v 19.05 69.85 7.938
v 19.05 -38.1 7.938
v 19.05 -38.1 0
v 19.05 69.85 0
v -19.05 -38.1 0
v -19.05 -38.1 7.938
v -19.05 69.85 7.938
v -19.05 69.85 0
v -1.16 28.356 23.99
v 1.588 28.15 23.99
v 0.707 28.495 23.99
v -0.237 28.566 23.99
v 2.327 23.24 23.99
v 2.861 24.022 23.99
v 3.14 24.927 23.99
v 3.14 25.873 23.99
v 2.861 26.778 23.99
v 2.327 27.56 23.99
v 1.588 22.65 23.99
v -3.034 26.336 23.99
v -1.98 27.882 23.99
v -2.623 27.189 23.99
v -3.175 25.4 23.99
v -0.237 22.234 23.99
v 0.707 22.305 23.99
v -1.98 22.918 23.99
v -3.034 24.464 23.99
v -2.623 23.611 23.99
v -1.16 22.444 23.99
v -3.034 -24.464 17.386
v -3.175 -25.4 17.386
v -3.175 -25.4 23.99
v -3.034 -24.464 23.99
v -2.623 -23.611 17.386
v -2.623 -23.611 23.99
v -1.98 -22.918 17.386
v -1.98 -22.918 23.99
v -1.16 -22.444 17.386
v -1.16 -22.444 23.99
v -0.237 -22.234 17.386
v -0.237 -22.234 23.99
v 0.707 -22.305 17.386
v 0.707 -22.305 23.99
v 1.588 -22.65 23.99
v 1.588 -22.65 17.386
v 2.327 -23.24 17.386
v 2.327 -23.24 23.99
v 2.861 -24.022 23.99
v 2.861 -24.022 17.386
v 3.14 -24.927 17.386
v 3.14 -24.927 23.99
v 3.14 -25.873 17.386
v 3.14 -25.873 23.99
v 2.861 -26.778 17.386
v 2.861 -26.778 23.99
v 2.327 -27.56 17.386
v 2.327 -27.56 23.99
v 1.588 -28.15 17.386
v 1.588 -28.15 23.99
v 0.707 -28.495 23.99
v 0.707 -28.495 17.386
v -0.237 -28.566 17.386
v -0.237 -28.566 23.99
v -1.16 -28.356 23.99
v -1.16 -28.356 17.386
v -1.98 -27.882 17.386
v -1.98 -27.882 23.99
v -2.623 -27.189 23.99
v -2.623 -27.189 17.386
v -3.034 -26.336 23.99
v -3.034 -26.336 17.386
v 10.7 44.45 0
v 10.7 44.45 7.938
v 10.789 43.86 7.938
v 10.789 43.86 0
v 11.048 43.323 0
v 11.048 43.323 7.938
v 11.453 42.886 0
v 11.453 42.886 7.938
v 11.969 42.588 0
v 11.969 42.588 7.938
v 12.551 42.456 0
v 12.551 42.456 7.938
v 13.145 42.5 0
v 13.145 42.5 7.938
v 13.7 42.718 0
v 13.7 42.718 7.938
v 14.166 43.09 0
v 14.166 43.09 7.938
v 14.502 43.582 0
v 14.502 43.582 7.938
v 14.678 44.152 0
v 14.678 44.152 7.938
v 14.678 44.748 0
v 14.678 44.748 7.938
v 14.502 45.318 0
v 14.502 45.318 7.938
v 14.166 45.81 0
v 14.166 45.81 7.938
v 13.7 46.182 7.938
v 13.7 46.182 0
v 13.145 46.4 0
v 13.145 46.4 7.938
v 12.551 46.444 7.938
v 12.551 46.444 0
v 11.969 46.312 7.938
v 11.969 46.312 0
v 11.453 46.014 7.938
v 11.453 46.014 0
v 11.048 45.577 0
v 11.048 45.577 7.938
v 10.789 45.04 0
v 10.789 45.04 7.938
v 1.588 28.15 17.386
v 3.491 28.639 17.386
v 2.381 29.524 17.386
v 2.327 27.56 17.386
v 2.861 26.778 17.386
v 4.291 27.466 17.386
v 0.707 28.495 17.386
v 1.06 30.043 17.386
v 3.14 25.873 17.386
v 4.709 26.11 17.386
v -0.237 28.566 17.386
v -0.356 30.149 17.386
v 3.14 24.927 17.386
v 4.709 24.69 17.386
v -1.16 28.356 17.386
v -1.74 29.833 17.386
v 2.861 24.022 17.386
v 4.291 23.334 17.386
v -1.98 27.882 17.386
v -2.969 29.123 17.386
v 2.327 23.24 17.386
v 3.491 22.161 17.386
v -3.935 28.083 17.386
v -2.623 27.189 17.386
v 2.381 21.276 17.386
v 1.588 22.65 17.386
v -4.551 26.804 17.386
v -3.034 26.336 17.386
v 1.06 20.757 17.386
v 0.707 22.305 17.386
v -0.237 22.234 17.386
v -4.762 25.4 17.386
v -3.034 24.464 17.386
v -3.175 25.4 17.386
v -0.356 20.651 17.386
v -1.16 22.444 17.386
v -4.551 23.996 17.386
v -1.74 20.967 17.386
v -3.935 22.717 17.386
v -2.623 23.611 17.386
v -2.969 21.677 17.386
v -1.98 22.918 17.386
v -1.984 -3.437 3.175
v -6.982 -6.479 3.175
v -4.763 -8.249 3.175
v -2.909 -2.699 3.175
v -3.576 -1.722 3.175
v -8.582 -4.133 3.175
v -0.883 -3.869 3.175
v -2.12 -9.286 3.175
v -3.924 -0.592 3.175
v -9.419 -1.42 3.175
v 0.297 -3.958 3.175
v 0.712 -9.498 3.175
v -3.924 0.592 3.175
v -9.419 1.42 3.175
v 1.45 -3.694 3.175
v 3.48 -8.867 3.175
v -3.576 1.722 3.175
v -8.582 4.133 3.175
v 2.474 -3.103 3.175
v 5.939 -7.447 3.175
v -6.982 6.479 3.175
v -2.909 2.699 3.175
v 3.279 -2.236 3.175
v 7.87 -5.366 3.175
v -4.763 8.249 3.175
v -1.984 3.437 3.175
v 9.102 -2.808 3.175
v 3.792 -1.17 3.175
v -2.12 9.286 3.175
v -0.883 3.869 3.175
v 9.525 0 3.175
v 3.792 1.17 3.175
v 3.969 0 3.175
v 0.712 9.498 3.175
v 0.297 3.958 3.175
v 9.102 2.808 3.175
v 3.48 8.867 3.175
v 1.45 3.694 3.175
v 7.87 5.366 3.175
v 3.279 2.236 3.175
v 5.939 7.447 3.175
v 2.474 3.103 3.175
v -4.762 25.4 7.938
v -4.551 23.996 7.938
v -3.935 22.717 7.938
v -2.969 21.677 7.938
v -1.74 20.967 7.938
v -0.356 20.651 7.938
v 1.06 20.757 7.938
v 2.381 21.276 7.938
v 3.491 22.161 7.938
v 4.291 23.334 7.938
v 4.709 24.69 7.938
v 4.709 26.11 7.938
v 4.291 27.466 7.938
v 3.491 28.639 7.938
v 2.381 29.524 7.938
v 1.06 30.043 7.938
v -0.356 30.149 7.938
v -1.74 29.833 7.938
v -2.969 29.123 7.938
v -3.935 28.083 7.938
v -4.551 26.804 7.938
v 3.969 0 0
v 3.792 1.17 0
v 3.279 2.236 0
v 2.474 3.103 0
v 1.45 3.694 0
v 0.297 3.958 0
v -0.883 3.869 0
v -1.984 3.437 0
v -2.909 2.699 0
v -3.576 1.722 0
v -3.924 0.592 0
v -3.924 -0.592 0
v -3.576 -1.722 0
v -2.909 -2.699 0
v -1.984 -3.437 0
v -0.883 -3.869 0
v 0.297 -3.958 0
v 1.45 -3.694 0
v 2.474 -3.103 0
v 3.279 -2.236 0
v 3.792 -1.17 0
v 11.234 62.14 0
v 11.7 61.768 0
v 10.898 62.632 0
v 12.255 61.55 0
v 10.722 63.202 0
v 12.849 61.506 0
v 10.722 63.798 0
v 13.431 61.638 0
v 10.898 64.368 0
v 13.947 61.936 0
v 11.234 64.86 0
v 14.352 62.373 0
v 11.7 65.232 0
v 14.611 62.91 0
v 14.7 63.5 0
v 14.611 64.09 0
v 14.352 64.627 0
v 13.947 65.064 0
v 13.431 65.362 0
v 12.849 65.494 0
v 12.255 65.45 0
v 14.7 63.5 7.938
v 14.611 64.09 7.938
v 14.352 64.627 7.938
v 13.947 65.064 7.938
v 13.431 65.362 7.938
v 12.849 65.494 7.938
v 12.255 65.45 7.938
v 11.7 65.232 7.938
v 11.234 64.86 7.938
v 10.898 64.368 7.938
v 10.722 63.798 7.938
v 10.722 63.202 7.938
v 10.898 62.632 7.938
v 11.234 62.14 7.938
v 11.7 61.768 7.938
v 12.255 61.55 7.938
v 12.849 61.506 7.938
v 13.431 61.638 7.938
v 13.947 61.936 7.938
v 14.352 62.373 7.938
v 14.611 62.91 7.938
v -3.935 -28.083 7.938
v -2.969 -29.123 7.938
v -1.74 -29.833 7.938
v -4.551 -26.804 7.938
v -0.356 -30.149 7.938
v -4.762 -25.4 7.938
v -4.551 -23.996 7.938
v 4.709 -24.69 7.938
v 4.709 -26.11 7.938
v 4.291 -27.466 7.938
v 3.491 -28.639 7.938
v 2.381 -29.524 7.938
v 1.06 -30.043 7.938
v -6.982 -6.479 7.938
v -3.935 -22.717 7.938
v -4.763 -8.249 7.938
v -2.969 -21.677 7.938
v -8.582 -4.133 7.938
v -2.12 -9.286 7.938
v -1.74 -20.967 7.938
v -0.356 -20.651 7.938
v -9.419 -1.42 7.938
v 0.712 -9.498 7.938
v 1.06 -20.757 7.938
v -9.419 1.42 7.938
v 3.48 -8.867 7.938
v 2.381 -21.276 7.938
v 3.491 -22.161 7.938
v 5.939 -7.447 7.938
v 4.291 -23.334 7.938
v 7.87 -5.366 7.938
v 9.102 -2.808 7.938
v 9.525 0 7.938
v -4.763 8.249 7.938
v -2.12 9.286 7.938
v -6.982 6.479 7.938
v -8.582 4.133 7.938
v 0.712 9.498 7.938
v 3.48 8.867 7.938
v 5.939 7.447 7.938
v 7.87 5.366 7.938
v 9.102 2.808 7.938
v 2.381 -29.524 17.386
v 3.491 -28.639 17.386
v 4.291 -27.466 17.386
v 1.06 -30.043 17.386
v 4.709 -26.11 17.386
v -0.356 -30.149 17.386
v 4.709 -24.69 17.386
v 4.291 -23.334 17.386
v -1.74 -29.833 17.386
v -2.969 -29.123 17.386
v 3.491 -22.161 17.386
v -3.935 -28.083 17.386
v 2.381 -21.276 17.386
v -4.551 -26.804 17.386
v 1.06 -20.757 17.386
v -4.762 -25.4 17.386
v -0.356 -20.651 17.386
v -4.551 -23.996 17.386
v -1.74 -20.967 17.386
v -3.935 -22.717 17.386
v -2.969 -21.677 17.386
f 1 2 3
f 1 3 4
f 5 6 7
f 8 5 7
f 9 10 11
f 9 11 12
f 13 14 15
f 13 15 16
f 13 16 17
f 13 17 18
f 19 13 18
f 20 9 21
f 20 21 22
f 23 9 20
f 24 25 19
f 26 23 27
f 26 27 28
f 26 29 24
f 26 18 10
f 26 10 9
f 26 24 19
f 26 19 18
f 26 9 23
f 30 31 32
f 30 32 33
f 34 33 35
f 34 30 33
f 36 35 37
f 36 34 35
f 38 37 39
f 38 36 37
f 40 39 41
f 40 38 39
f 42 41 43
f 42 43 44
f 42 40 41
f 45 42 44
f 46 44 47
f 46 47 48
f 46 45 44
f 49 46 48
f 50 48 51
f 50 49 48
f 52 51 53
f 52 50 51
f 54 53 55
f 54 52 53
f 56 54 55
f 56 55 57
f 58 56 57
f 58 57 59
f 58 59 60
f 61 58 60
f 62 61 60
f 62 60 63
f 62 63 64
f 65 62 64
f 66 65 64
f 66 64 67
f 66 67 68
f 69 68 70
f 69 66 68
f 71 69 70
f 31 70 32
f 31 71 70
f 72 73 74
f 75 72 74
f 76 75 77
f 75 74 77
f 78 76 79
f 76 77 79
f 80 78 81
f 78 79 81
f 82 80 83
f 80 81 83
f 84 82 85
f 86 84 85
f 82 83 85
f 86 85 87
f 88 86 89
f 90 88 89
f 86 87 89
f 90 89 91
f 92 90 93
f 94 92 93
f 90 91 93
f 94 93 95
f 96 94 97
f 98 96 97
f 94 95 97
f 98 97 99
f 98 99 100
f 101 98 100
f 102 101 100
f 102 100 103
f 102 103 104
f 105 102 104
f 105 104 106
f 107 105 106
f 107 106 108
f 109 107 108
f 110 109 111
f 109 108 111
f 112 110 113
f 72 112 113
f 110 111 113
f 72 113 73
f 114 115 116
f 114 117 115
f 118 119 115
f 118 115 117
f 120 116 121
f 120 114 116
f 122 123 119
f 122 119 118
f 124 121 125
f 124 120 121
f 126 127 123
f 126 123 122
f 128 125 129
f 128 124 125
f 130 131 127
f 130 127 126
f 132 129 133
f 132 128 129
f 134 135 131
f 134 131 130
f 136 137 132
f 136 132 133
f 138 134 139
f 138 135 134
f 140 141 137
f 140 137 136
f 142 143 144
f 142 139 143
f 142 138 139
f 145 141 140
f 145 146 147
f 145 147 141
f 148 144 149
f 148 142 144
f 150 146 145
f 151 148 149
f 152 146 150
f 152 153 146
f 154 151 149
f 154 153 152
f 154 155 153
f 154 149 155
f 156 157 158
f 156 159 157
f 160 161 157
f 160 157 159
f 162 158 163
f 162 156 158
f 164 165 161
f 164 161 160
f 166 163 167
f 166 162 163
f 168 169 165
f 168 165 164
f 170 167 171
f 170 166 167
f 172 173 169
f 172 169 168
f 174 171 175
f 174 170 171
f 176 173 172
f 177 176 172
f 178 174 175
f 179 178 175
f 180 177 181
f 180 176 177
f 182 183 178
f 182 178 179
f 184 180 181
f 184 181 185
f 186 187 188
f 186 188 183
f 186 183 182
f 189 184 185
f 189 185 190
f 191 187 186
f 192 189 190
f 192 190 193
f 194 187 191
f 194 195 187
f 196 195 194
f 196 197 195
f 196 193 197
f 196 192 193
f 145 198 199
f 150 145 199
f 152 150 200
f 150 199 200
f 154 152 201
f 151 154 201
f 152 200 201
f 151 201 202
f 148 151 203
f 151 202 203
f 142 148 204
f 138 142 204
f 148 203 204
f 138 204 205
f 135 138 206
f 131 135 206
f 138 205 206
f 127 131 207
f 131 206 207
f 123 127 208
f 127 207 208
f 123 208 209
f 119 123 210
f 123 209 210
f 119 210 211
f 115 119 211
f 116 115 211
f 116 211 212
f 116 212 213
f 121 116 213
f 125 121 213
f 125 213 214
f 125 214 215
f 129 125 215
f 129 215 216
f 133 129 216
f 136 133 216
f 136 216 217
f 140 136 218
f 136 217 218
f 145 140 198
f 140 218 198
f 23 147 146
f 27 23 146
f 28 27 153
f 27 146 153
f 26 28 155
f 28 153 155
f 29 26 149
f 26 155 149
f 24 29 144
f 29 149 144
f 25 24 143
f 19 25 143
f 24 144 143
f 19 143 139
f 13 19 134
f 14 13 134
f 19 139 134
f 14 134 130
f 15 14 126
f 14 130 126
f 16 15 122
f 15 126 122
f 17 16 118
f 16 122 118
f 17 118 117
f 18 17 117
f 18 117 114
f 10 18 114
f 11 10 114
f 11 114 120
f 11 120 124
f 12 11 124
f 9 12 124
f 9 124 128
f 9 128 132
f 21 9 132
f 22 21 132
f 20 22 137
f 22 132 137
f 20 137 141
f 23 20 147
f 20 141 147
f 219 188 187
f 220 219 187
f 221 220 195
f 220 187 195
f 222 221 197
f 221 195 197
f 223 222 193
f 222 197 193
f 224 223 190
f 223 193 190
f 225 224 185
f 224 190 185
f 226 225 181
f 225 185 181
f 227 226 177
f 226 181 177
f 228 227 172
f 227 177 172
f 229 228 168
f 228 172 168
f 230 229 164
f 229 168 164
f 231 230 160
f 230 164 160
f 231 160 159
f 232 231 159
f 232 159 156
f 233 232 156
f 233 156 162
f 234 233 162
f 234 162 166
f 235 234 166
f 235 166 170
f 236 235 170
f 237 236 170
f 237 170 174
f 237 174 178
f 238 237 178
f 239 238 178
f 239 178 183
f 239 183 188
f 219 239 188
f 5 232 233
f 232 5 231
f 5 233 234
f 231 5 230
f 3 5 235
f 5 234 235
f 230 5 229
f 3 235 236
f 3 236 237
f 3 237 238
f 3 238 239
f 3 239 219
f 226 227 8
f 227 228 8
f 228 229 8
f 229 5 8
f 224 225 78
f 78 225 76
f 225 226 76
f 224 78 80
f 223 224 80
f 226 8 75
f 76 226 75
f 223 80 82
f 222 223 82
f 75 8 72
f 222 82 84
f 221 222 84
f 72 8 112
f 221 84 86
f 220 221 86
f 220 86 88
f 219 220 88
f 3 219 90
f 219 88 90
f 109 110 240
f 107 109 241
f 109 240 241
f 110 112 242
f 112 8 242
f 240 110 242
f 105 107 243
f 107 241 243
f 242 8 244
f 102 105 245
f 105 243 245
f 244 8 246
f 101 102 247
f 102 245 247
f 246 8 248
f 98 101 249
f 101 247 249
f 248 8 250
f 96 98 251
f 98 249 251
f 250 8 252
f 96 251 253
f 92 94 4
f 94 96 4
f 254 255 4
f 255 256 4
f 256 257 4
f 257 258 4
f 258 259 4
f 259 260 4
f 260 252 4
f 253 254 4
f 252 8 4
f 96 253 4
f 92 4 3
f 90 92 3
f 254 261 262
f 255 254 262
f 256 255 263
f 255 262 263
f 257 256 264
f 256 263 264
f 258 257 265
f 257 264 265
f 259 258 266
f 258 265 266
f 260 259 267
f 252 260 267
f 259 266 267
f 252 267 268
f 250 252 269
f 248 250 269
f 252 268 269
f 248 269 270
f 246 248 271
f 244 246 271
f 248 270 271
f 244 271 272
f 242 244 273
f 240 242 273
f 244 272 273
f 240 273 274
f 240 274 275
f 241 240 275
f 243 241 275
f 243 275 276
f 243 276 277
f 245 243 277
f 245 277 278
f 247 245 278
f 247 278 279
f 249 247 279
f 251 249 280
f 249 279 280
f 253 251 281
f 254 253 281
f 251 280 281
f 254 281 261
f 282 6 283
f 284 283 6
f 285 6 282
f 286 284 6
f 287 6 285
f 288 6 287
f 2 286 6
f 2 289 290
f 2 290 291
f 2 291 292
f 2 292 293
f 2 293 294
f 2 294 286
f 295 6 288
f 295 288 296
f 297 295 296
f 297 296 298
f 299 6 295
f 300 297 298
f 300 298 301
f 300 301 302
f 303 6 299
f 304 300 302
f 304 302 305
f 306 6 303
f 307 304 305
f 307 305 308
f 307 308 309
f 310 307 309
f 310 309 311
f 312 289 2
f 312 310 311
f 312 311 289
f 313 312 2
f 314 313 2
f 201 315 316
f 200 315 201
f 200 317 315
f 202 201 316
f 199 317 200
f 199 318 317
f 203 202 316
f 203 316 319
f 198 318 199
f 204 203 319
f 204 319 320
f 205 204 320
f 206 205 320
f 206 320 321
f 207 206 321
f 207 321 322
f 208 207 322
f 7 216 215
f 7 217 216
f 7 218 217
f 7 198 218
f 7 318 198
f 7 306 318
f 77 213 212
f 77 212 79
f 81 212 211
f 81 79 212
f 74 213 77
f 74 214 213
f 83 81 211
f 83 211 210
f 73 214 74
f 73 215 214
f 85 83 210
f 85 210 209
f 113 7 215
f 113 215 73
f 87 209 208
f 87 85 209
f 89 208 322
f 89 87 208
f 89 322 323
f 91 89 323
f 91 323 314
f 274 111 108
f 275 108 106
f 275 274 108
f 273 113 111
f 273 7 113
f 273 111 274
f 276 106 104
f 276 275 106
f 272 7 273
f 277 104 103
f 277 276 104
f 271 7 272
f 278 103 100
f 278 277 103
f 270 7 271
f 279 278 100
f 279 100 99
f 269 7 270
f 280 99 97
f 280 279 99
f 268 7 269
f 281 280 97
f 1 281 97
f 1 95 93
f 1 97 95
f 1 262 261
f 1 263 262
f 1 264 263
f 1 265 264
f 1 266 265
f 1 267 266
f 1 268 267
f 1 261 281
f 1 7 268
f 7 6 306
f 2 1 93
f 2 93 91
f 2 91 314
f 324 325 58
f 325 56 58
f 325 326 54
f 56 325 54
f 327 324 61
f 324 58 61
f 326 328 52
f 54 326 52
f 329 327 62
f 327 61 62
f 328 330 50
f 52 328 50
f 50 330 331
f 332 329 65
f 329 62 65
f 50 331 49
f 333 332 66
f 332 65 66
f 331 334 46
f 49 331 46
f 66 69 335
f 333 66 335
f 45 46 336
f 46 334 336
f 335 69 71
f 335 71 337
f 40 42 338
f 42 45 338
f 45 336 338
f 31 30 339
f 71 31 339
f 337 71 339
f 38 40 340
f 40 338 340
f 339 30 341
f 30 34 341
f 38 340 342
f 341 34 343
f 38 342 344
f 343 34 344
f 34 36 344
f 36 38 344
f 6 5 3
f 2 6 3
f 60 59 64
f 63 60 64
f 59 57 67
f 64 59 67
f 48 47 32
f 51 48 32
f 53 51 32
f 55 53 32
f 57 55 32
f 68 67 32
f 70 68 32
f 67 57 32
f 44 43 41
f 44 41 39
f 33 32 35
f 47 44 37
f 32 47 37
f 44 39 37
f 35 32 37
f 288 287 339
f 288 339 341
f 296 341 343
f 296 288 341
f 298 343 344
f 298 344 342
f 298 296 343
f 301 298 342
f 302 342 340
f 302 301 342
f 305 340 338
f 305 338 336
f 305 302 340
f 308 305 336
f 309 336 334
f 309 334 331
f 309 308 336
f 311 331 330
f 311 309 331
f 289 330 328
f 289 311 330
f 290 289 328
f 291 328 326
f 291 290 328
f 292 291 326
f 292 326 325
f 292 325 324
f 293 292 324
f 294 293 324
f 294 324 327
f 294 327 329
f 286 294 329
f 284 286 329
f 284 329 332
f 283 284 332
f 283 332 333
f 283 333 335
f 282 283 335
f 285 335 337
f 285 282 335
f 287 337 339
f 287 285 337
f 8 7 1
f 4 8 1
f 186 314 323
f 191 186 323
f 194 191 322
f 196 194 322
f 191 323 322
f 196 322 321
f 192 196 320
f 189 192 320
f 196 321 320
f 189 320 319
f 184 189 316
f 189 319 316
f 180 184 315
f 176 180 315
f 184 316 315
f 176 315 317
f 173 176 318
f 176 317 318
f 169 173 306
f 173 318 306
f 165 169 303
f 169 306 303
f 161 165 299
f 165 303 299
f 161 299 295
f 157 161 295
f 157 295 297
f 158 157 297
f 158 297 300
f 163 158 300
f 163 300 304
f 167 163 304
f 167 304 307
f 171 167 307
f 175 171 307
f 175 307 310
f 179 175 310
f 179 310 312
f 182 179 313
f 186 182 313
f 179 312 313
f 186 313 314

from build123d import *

# Parameters (mm, degrees)
SKETCH1_W           = 38.1
SKETCH1_H           = 76.2
BOSS_EXTRUDE1_DEPTH = 7.9375
SKETCH2_R           = 3.96875
CUT_EXTRUDE1_DEPTH  = 44.330317403
SKETCH4_R           = 9.525
CUT_EXTRUDE2_DEPTH  = 4.7625
SKETCH5_R           = 4.7625
BOSS_EXTRUDE2_DEPTH = 9.4488
SKETCH6_R           = 3.175
BOSS_EXTRUDE3_DEPTH = 6.604
SKETCH7_W           = 38.1
SKETCH7_H           = 31.75
SKETCH7_R           = 2
BOSS_EXTRUDE4_DEPTH = 7.9375


with BuildPart() as part:
    # Sketch1 → Boss-Extrude1 (new body)
    with BuildSketch(Plane.XY):
        Rectangle(SKETCH1_W, SKETCH1_H)
    extrude(amount=BOSS_EXTRUDE1_DEPTH)

    # Sketch2 → Cut-Extrude1 (cut, through all)
    with BuildSketch(Plane.XY.offset(7.9375)):
        Circle(SKETCH2_R)
    extrude(amount=-CUT_EXTRUDE1_DEPTH, mode=Mode.SUBTRACT)

    # Sketch4 → Cut-Extrude2 (cut)
    with BuildSketch(Plane.XY.offset(7.9375)):
        Circle(SKETCH4_R)
    extrude(amount=-CUT_EXTRUDE2_DEPTH, mode=Mode.SUBTRACT)

    # Sketch5 → Boss-Extrude2 (add)
    with BuildSketch(Plane.XY.offset(7.9375)):
        with Locations(Location((0, 25.4, 0), (0, 0, 180))):
            Circle(SKETCH5_R)
    boss_extrude2 = extrude(amount=BOSS_EXTRUDE2_DEPTH)

    # Sketch6 → Boss-Extrude3 (add)
    with BuildSketch(Plane.XY.offset(17.3863)):
        with Locations(Location((0, 25.4, 0), (0, 0, 180))):
            Circle(SKETCH6_R)
    boss_extrude3 = extrude(amount=BOSS_EXTRUDE3_DEPTH)

    # Mirror1: Boss-Extrude2, Boss-Extrude3 across plane
    add(boss_extrude2.mirror(Plane.ZX))
    add(boss_extrude3.mirror(Plane.ZX))

    # Sketch7 → Boss-Extrude4 (add)
    with BuildSketch(Plane.XY.offset(7.9375)):
        with Locations((0, 53.975)):
            Rectangle(SKETCH7_W, SKETCH7_H)
        with Locations((12.7, 63.5)):
            Circle(SKETCH7_R, mode=Mode.SUBTRACT)
        with Locations(Location((12.7, 44.45, 0), (0, 0, 180))):
            Circle(SKETCH7_R, mode=Mode.SUBTRACT)
    extrude(amount=-BOSS_EXTRUDE4_DEPTH)


solid = part.part
